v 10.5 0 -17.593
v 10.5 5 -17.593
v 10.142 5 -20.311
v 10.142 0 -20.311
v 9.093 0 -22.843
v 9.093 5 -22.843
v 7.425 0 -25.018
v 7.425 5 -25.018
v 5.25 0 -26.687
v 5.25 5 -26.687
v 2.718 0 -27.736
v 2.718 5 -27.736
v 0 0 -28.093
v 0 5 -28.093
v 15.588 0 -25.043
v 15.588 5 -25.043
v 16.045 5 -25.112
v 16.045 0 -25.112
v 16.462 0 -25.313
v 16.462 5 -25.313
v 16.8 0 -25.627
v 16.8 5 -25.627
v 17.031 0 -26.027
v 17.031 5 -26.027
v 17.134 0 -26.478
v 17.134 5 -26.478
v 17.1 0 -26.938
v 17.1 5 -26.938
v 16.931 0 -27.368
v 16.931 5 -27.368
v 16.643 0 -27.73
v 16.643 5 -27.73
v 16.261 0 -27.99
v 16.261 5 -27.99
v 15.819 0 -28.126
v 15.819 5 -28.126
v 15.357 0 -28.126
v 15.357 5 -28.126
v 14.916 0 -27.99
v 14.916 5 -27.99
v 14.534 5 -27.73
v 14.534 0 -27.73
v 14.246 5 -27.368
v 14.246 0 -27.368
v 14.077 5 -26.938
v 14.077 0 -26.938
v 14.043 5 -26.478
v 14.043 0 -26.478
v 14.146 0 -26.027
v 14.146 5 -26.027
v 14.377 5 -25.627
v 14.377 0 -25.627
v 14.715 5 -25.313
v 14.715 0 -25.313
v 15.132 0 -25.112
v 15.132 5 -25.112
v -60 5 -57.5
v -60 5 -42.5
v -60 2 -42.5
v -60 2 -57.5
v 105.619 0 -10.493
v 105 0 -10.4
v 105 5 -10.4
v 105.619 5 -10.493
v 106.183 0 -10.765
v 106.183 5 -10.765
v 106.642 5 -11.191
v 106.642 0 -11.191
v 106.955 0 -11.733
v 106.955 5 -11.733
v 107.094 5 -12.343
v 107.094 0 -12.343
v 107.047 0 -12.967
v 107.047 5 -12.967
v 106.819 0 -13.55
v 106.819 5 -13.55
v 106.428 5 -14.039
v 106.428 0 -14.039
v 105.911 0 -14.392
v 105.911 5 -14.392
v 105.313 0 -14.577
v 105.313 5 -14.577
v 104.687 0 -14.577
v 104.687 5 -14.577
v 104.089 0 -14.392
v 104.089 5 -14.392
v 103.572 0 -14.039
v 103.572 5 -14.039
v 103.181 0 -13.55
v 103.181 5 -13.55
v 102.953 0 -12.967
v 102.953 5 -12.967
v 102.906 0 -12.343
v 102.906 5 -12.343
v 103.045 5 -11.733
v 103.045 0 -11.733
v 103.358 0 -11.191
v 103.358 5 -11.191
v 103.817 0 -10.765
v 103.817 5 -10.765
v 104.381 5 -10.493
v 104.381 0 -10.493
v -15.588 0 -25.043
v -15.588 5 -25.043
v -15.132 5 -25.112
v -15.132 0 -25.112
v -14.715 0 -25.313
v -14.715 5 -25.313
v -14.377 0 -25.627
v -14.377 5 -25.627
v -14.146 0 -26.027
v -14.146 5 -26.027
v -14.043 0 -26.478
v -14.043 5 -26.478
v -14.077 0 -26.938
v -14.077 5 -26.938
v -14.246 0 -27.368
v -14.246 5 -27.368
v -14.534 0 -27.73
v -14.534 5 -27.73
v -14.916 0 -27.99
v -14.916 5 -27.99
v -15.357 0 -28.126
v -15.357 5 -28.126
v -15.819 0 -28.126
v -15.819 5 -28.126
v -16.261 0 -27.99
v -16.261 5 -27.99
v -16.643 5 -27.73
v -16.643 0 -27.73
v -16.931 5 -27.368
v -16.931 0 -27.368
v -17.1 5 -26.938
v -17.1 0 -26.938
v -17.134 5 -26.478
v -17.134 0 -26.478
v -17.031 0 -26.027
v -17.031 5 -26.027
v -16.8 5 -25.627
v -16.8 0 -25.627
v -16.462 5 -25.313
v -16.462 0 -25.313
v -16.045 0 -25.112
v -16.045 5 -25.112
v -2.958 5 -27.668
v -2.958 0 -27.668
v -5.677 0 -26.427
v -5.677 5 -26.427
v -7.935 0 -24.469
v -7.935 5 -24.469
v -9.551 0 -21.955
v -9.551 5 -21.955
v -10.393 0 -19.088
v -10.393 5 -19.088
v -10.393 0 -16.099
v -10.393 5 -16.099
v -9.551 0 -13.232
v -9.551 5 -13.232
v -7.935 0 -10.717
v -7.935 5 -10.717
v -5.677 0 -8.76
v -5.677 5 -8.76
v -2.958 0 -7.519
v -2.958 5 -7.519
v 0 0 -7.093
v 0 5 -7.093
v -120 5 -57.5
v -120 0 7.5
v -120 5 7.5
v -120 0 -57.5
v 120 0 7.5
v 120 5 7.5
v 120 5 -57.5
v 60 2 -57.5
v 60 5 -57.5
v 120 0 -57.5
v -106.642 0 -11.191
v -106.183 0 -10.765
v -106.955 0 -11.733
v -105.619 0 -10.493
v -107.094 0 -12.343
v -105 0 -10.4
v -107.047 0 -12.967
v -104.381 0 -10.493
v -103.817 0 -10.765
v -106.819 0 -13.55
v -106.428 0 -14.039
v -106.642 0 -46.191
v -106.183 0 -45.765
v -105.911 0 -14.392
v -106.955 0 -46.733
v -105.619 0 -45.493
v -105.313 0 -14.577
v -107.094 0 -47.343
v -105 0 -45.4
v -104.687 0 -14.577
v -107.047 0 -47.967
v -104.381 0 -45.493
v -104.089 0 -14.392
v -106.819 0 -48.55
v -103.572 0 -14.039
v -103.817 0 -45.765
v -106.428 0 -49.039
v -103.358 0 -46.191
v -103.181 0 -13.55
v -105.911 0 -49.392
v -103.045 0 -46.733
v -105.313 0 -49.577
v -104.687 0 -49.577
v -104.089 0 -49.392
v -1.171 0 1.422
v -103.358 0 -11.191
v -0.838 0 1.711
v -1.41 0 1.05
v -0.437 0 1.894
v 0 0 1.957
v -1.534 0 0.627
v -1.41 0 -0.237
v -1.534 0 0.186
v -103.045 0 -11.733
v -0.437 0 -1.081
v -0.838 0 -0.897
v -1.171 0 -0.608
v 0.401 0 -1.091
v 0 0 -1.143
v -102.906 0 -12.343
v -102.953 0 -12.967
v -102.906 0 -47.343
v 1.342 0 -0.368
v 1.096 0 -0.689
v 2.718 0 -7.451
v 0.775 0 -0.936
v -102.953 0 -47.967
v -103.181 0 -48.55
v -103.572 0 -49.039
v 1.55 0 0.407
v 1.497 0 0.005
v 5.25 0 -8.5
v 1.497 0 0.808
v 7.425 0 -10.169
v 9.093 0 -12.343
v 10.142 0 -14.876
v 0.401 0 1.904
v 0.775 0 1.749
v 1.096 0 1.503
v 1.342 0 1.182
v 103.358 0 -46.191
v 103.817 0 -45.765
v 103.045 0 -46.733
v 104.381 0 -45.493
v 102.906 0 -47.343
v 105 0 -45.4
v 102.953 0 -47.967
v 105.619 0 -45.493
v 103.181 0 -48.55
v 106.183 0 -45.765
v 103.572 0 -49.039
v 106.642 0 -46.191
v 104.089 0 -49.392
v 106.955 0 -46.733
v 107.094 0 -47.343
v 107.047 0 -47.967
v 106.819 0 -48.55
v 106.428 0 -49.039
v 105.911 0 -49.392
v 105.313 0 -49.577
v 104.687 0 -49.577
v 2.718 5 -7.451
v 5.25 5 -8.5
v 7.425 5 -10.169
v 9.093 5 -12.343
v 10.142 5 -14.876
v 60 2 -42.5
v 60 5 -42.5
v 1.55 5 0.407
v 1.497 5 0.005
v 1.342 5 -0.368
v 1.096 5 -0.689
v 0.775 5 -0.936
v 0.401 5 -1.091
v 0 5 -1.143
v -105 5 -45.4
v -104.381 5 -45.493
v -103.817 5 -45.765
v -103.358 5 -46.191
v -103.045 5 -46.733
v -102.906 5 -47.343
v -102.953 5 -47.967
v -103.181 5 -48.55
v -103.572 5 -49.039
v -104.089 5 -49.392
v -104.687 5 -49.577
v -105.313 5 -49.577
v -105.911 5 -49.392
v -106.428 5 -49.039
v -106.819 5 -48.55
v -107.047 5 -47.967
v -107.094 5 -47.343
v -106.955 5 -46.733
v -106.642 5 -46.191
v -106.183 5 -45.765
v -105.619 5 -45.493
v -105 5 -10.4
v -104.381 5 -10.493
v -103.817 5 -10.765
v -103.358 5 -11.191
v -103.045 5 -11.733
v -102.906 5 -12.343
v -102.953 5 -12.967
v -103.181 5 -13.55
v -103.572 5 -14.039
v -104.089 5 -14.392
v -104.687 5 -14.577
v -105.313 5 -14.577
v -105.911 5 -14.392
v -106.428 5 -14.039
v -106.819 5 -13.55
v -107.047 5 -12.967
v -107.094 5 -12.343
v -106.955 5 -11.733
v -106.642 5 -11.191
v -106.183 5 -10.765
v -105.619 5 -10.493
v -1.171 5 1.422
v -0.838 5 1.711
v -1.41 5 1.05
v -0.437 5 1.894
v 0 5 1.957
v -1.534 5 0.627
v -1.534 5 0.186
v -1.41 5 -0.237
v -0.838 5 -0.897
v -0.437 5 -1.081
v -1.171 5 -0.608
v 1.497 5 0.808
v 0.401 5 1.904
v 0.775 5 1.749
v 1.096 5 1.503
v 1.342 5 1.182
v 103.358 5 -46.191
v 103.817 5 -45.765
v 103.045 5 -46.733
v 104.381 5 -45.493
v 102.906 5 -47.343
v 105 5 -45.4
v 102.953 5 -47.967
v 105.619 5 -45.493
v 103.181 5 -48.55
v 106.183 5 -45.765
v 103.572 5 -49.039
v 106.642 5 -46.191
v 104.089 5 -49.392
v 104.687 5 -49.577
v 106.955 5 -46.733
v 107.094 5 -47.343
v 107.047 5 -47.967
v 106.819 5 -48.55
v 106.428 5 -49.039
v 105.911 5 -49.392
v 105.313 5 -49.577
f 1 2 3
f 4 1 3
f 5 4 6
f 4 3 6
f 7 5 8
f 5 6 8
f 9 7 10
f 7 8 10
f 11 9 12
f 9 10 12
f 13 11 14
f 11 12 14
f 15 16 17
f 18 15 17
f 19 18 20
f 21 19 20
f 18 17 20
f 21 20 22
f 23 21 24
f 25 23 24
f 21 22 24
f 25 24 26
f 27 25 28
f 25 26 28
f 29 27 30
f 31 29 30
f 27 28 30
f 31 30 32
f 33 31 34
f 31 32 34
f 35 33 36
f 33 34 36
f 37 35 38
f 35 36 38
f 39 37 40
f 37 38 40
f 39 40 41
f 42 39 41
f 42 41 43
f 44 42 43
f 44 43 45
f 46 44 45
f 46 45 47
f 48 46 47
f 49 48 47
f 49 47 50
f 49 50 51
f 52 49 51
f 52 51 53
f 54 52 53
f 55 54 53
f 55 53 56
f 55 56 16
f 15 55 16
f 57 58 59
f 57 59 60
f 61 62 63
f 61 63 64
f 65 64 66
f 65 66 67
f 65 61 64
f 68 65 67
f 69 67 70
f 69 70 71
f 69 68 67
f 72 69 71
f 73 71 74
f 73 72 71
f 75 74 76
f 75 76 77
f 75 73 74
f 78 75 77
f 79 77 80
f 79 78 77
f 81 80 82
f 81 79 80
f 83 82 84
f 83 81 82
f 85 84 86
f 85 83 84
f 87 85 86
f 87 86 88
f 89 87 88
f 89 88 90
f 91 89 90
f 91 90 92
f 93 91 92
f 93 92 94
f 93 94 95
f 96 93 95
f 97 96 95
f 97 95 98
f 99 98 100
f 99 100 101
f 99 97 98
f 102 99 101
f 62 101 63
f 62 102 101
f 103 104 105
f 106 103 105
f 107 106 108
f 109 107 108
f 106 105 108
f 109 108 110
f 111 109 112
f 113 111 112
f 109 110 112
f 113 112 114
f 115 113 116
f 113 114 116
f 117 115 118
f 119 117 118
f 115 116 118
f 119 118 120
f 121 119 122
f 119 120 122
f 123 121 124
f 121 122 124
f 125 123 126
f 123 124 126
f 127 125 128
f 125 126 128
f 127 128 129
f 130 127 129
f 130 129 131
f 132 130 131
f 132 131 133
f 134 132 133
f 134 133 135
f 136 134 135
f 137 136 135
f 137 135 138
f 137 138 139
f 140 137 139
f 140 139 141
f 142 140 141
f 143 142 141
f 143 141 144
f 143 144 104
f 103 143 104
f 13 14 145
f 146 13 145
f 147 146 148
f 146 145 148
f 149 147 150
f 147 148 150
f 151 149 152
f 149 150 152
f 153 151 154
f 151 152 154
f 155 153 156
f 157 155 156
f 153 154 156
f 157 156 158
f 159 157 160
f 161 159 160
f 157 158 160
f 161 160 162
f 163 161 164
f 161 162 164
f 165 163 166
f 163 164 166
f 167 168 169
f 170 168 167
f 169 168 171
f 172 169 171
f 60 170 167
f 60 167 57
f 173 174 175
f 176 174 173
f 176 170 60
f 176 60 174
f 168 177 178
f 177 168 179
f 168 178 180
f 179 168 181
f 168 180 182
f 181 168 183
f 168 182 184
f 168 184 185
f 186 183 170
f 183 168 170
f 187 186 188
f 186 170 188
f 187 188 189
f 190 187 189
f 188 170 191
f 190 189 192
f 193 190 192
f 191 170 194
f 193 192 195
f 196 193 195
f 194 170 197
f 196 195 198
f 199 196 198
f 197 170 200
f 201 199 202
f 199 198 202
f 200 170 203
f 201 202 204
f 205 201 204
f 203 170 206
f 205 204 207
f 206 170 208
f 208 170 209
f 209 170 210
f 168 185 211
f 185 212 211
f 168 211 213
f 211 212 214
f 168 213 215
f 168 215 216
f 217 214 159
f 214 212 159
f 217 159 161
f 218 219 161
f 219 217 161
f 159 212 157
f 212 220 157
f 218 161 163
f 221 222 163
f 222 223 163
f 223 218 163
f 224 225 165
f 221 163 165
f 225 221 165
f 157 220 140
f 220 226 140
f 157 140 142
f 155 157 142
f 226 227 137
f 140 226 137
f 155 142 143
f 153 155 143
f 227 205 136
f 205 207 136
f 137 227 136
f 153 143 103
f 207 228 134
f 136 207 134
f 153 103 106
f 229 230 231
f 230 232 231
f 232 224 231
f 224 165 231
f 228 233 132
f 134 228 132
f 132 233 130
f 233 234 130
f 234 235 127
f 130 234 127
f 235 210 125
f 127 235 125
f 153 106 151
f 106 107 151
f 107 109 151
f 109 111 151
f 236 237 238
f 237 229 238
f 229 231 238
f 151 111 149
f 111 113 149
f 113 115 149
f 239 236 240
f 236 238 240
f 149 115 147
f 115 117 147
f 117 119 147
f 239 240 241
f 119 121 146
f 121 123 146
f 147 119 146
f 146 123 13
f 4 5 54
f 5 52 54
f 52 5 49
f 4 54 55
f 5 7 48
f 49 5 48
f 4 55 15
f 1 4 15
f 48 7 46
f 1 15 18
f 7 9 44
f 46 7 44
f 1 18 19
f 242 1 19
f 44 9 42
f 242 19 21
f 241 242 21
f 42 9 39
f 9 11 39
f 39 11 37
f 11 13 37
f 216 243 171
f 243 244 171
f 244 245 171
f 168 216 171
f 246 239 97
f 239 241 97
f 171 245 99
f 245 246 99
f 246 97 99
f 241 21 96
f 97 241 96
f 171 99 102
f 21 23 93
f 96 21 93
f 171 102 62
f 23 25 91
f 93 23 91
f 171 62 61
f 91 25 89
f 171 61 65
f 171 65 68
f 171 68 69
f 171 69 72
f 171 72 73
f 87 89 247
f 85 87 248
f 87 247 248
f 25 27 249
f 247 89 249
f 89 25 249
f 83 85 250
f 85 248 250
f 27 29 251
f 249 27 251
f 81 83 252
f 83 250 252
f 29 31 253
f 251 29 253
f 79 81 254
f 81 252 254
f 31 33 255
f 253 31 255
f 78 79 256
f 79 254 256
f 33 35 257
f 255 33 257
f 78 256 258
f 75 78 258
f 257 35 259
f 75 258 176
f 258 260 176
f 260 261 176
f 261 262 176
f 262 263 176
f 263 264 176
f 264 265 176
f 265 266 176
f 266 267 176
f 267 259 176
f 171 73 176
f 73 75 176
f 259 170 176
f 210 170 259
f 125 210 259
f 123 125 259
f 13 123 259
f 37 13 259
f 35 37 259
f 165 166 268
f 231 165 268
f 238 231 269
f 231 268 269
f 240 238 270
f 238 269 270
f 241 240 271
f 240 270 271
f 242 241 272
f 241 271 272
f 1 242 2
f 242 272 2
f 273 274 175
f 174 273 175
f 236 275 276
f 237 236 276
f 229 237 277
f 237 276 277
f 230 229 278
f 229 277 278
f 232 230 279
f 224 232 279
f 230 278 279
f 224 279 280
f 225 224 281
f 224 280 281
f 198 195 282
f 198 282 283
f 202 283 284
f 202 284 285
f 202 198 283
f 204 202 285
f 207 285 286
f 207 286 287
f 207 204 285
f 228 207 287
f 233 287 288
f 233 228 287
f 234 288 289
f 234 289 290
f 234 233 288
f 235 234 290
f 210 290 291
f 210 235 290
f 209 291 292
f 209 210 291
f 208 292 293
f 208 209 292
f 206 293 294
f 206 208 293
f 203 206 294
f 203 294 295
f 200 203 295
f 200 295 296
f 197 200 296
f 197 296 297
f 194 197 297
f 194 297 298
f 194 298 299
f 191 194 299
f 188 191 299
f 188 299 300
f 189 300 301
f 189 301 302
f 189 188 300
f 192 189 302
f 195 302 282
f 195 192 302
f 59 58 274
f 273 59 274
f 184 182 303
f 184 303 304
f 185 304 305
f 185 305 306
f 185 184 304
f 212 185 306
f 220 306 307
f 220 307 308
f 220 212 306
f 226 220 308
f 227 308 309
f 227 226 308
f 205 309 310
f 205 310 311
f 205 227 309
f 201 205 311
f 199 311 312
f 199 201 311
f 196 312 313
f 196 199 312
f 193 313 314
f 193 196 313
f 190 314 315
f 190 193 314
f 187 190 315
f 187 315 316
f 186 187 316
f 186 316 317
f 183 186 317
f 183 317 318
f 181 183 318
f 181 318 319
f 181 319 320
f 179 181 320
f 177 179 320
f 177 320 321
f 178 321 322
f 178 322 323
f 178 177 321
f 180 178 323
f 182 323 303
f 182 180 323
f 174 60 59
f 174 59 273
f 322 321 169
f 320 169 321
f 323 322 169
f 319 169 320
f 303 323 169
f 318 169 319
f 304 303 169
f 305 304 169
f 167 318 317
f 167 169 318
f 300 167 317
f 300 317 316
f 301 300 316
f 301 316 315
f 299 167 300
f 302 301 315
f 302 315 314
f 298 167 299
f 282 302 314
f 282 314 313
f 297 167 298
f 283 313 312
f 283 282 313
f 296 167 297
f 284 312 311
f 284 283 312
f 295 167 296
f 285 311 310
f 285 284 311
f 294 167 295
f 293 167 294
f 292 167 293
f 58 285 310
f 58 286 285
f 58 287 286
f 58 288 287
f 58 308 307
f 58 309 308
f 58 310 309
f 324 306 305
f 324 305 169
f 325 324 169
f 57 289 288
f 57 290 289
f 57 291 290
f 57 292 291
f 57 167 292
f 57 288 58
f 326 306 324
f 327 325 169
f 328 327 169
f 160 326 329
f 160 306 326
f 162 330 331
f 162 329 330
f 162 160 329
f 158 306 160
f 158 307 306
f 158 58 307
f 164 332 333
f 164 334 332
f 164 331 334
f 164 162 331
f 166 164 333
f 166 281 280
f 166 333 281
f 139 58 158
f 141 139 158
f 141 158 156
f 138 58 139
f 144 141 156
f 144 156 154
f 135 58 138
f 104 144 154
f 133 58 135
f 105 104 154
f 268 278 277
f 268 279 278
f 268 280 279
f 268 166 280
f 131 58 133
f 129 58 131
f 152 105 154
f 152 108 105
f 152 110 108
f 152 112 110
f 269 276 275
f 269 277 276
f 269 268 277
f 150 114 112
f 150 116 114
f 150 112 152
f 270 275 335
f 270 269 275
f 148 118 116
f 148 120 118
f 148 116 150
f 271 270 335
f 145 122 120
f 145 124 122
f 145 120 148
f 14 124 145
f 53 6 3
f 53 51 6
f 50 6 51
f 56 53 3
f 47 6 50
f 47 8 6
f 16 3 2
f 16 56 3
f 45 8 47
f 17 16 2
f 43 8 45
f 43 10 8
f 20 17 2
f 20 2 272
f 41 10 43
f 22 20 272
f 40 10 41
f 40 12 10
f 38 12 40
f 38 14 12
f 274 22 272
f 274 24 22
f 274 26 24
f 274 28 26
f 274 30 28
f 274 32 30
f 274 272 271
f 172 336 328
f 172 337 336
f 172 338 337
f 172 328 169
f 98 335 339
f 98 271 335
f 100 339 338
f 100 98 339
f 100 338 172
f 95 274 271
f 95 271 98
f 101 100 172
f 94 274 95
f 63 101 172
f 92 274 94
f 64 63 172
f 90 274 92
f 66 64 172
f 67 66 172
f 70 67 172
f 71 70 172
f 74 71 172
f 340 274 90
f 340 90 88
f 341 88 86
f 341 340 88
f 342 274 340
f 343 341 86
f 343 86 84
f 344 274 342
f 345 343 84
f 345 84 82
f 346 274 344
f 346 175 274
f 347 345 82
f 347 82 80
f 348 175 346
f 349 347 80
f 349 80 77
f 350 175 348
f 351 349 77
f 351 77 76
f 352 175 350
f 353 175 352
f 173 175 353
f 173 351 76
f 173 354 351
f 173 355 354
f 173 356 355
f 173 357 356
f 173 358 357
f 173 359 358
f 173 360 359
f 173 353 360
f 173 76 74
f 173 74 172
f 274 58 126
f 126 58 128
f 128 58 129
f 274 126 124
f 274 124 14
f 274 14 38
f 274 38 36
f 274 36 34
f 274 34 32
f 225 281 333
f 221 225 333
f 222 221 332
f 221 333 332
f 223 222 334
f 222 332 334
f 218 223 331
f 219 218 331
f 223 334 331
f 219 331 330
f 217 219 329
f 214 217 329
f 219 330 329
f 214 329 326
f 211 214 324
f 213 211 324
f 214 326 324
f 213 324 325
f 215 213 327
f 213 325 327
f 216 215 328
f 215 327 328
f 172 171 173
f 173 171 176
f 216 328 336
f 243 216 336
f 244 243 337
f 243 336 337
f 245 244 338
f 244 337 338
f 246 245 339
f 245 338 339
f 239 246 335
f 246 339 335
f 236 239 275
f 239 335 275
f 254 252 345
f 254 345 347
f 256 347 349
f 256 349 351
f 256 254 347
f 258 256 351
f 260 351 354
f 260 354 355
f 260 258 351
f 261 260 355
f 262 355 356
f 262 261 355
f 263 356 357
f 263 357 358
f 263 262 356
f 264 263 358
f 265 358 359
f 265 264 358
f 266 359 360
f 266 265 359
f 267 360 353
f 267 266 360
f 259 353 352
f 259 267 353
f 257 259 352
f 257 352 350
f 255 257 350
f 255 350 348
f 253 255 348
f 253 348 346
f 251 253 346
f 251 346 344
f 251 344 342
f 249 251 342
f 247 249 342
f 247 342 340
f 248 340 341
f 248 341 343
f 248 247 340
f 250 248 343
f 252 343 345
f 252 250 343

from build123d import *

# Parameters (mm, degrees)
SKETCH_1_W          = 240
SKETCH_1_H          = 65
SKETCH_1_R          = 2.1
EXTRUDE_1_DEPTH     = 5
SKETCH_2_W          = 120
SKETCH_2_H          = 15
CUT_EXTRUDE_1_DEPTH = 3
SKETCH_3_R          = 1.55
CUT_EXTRUDE_2_DEPTH = 32


with BuildPart() as part:
    # 草图1 → 凸台-拉伸1 (new body)
    with BuildSketch(Plane(origin=(0, 0, 0), x_dir=(1, 0, 0), z_dir=(0, 1, 0))):
        with Locations((0, 25)):
            Rectangle(SKETCH_1_W, SKETCH_1_H)
        with Locations(Location((105, 12.5, 0), (0, 0, 270))):
            Circle(SKETCH_1_R, mode=Mode.SUBTRACT)
        with Locations(Location((-105, 12.5, 0), (0, 0, 270))):
            Circle(SKETCH_1_R, mode=Mode.SUBTRACT)
        with Locations(Location((-105, 47.5, 0), (0, 0, 270))):
            Circle(SKETCH_1_R, mode=Mode.SUBTRACT)
        with Locations(Location((105, 47.5, 0), (0, 0, 270))):
            Circle(SKETCH_1_R, mode=Mode.SUBTRACT)
    extrude(amount=EXTRUDE_1_DEPTH)

    # 草图2 → 切除-拉伸1 (cut)
    with BuildSketch(Plane(origin=(0, 5, 0), x_dir=(1, 0, 0), z_dir=(0, 1, 0))):
        with Locations((0, 50)):
            Rectangle(SKETCH_2_W, SKETCH_2_H)
    extrude(amount=-CUT_EXTRUDE_1_DEPTH, mode=Mode.SUBTRACT)

    # 草图3 → 切除-拉伸2 (cut)
    with BuildSketch(Plane(origin=(0, 5, 0), x_dir=(1, 0, 0), z_dir=(0, 1, 0))):
        with BuildLine():
            ThreePointArc((10.5, 17.593406236), (7.424621202, 25.018027438), (0, 28.093406236))
            Line((0, 28.093406236), (0, 7.093406236))
            ThreePointArc((0, 7.093406236), (7.424621202, 10.168785033), (10.5, 17.593406236))
        make_face()
        with BuildLine():
            Line((0, 7.093406236), (0, 28.093406236))
            ThreePointArc((0, 28.093406236), (-10.5, 17.593406236), (0, 7.093406236))
        make_face()
        with Locations(Location((15.588457268, 26.593406236, 0), (0, 0, 270))):
            Circle(SKETCH_3_R)
        with BuildLine():
            ThreePointArc((1.55, -0.406593764), (1.096015511, 0.689421747), (0, 1.143406236))
            Line((0, 1.143406236), (0, -1.956593764))
            ThreePointArc((0, -1.956593764), (1.096015511, -1.502609275), (1.55, -0.406593764))
        make_face()
        with BuildLine():
            Line((0, -1.956593764), (0, 1.143406236))
            ThreePointArc((0, 1.143406236), (-1.55, -0.406593764), (0, -1.956593764))
        make_face()
        with Locations(Location((-15.588457268, 26.593406236, 0), (0, 0, 270))):
            Circle(SKETCH_3_R)
    extrude(amount=-CUT_EXTRUDE_2_DEPTH, mode=Mode.SUBTRACT)


solid = part.part
